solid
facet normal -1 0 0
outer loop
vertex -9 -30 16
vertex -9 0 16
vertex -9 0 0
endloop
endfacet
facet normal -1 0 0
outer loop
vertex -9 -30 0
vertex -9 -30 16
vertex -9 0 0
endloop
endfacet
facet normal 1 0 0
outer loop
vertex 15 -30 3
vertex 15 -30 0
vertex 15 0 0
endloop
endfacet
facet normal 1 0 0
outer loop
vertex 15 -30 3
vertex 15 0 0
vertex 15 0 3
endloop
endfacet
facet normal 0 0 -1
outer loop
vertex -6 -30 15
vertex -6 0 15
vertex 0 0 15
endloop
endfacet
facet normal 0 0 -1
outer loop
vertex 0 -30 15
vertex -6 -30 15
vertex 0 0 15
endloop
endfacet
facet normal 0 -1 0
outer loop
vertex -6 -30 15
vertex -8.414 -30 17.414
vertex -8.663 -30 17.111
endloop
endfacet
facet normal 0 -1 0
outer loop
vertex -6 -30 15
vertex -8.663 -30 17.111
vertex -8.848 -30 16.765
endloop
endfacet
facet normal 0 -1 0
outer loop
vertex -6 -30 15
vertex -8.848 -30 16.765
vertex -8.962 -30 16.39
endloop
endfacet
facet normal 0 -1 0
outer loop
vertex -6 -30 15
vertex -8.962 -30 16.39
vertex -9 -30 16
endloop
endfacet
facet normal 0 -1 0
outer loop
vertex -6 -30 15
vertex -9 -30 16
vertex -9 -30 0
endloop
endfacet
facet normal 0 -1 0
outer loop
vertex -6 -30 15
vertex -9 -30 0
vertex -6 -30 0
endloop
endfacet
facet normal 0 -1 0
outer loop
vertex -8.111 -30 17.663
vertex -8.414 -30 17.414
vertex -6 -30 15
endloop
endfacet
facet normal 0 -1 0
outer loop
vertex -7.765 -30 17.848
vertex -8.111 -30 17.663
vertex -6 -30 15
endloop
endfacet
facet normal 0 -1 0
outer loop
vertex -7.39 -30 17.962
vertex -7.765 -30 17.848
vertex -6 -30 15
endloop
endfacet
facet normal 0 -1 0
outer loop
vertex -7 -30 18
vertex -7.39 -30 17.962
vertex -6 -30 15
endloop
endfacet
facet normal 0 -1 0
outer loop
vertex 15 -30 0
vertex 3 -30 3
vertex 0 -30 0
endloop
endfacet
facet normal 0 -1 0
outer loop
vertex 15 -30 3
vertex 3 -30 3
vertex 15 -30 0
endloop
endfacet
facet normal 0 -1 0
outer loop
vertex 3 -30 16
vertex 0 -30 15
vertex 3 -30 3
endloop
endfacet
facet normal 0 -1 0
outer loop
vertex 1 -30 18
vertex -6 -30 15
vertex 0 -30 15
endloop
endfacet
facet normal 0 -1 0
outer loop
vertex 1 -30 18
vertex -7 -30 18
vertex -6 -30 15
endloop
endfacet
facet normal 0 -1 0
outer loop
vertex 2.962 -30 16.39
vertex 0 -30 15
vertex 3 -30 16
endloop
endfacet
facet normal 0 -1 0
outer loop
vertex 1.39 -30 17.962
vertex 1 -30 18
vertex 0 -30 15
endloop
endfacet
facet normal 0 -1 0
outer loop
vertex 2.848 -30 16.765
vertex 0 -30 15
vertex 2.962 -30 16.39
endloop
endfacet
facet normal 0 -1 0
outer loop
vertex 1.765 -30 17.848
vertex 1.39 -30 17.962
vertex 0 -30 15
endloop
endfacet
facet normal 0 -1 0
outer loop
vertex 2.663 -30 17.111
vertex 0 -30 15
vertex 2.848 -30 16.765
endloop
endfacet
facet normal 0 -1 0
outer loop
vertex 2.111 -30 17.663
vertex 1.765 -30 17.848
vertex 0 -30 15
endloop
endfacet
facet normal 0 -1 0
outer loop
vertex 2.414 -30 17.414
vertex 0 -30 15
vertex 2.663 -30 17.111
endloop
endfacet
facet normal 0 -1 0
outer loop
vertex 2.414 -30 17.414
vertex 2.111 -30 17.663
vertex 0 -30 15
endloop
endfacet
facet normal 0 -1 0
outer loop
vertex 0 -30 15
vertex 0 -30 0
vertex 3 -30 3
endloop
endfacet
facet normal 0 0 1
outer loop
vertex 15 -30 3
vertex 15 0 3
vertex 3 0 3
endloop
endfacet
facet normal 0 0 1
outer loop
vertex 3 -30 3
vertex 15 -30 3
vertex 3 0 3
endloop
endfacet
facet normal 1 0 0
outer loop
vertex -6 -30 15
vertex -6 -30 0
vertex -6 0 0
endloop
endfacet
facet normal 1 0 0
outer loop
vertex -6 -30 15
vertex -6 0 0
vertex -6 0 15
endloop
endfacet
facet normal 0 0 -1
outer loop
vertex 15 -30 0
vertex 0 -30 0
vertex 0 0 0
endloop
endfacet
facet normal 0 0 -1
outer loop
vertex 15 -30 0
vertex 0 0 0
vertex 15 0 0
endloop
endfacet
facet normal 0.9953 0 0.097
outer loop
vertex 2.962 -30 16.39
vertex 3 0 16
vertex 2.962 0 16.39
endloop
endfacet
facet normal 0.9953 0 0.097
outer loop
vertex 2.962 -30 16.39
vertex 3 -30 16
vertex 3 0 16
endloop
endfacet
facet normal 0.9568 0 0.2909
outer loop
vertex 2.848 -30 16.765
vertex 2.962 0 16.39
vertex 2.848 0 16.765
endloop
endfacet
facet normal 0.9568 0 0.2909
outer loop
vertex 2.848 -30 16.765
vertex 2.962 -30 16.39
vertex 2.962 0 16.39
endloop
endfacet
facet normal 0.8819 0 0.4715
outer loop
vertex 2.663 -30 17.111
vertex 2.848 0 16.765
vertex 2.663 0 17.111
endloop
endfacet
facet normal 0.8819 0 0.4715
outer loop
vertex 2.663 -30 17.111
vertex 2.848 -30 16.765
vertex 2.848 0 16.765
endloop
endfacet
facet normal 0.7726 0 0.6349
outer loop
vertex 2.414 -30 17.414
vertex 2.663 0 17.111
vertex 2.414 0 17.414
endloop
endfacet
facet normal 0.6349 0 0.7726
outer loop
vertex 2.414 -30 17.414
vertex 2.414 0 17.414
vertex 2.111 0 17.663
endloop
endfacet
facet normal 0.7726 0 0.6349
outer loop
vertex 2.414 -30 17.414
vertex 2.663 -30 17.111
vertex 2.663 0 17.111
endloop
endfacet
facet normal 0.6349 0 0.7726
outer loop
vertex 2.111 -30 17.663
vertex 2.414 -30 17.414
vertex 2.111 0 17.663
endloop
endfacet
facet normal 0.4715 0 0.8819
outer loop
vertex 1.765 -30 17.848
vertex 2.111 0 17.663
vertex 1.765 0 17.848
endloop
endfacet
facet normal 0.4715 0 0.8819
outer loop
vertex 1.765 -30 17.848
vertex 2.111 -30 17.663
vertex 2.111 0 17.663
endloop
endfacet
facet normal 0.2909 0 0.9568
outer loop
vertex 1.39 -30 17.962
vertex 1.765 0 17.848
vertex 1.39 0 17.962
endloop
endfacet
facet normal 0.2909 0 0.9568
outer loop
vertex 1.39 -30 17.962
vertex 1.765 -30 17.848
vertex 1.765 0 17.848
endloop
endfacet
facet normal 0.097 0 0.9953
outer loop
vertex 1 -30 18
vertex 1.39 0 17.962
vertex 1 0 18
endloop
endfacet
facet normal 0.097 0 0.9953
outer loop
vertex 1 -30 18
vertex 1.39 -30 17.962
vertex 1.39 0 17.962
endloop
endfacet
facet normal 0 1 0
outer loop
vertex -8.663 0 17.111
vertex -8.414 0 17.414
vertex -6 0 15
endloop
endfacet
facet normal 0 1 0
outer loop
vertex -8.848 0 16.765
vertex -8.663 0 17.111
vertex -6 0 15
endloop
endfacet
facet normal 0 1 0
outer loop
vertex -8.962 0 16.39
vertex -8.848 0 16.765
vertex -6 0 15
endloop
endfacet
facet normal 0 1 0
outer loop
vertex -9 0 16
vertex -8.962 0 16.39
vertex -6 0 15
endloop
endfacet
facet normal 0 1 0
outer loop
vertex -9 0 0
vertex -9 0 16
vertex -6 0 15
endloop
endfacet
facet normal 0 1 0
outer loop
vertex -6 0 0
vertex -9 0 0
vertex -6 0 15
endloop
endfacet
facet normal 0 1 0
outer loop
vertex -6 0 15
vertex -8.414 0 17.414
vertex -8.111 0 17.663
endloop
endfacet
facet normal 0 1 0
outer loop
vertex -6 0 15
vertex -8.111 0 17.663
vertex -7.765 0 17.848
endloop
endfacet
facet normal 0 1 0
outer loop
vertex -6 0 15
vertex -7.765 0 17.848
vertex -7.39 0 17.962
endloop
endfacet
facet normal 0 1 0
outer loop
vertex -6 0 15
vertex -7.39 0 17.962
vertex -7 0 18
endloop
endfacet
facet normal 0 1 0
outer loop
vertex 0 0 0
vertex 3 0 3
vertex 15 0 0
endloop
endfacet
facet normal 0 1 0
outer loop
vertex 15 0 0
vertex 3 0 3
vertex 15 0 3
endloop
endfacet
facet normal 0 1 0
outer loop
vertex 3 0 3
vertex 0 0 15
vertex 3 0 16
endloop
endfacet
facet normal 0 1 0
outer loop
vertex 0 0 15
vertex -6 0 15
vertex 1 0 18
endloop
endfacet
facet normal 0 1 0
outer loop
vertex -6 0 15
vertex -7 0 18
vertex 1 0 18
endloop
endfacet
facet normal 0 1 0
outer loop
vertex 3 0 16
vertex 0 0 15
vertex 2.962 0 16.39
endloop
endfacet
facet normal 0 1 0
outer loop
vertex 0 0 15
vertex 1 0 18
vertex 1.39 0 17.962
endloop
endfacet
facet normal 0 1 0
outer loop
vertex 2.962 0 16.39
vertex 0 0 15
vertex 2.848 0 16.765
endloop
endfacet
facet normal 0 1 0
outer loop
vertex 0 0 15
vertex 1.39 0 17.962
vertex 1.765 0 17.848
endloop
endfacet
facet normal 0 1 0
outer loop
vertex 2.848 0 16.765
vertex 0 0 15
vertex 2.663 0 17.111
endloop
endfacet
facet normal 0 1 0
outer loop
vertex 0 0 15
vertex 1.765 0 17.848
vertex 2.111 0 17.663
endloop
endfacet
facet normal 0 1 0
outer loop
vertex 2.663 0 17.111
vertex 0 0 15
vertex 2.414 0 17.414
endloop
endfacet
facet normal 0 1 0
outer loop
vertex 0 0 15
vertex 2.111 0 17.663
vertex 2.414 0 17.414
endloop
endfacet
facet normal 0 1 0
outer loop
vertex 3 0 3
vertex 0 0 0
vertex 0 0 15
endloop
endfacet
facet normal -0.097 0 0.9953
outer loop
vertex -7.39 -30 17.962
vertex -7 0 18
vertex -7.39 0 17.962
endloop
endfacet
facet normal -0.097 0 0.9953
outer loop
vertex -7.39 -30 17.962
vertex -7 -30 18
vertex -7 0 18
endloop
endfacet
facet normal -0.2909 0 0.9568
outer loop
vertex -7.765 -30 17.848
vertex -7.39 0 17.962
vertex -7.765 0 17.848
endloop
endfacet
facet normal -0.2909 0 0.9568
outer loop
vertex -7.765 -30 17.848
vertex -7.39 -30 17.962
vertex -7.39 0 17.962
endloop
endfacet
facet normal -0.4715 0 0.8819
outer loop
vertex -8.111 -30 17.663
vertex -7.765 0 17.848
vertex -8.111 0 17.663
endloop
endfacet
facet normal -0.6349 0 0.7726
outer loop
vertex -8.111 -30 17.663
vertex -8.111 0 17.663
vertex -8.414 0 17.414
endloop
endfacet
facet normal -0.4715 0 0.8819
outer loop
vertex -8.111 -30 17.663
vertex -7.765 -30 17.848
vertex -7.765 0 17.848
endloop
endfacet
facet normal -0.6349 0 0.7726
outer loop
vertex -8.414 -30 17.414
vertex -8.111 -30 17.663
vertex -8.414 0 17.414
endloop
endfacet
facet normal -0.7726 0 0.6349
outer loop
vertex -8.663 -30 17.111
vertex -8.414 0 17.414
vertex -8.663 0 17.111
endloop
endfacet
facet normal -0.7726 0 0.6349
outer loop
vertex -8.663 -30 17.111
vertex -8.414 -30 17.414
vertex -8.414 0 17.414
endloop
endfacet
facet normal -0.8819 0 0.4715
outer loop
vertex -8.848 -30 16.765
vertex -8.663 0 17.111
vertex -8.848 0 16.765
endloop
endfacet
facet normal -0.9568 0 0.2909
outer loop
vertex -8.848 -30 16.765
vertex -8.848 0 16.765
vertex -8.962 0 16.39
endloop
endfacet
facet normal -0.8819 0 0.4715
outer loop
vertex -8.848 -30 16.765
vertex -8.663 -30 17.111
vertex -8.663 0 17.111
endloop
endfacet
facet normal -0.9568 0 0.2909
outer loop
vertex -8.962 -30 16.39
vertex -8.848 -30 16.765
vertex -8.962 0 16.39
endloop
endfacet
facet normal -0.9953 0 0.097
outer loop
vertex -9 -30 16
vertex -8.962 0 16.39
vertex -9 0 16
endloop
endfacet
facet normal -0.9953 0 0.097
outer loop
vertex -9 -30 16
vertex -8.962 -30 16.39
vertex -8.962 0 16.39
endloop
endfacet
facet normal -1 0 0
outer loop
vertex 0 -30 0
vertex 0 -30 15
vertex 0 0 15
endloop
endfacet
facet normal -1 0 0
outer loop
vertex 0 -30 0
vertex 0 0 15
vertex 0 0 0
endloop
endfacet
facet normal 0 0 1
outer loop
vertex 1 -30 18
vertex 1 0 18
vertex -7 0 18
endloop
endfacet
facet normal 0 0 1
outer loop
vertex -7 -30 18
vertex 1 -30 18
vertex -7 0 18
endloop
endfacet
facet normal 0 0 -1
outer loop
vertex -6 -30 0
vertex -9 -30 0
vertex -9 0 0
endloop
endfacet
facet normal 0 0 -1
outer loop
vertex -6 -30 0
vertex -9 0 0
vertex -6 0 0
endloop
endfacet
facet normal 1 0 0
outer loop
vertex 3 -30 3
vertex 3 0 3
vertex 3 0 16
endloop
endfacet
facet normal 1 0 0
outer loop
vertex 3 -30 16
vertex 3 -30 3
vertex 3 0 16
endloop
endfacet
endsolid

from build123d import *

# Parameters (mm, degrees)
F1_DEPTH = 30
F2_R     = 2
F3_R     = 2


with BuildPart() as f1:
    # F0 (on Front) → F1 (new body)
    with BuildSketch(Plane.XZ):
        Polygon((-6, 0), (-6, 15), (0, 15), (0, 0), (15, 0), (15, 3), (3, 3), (3, 18), (-9, 18), (-9, 0), align=None)
    extrude(amount=F1_DEPTH)

    # F2
    f2_edges = [f1.edges().sort_by_distance(p)[0] for p in [
        (3, -15, 18),
    ]]
    fillet(f2_edges, radius=F2_R)

    # F3
    f3_edges = [f1.edges().sort_by_distance(p)[0] for p in [
        (-9, -15, 18),
    ]]
    fillet(f3_edges, radius=F3_R)


solid = f1.part
